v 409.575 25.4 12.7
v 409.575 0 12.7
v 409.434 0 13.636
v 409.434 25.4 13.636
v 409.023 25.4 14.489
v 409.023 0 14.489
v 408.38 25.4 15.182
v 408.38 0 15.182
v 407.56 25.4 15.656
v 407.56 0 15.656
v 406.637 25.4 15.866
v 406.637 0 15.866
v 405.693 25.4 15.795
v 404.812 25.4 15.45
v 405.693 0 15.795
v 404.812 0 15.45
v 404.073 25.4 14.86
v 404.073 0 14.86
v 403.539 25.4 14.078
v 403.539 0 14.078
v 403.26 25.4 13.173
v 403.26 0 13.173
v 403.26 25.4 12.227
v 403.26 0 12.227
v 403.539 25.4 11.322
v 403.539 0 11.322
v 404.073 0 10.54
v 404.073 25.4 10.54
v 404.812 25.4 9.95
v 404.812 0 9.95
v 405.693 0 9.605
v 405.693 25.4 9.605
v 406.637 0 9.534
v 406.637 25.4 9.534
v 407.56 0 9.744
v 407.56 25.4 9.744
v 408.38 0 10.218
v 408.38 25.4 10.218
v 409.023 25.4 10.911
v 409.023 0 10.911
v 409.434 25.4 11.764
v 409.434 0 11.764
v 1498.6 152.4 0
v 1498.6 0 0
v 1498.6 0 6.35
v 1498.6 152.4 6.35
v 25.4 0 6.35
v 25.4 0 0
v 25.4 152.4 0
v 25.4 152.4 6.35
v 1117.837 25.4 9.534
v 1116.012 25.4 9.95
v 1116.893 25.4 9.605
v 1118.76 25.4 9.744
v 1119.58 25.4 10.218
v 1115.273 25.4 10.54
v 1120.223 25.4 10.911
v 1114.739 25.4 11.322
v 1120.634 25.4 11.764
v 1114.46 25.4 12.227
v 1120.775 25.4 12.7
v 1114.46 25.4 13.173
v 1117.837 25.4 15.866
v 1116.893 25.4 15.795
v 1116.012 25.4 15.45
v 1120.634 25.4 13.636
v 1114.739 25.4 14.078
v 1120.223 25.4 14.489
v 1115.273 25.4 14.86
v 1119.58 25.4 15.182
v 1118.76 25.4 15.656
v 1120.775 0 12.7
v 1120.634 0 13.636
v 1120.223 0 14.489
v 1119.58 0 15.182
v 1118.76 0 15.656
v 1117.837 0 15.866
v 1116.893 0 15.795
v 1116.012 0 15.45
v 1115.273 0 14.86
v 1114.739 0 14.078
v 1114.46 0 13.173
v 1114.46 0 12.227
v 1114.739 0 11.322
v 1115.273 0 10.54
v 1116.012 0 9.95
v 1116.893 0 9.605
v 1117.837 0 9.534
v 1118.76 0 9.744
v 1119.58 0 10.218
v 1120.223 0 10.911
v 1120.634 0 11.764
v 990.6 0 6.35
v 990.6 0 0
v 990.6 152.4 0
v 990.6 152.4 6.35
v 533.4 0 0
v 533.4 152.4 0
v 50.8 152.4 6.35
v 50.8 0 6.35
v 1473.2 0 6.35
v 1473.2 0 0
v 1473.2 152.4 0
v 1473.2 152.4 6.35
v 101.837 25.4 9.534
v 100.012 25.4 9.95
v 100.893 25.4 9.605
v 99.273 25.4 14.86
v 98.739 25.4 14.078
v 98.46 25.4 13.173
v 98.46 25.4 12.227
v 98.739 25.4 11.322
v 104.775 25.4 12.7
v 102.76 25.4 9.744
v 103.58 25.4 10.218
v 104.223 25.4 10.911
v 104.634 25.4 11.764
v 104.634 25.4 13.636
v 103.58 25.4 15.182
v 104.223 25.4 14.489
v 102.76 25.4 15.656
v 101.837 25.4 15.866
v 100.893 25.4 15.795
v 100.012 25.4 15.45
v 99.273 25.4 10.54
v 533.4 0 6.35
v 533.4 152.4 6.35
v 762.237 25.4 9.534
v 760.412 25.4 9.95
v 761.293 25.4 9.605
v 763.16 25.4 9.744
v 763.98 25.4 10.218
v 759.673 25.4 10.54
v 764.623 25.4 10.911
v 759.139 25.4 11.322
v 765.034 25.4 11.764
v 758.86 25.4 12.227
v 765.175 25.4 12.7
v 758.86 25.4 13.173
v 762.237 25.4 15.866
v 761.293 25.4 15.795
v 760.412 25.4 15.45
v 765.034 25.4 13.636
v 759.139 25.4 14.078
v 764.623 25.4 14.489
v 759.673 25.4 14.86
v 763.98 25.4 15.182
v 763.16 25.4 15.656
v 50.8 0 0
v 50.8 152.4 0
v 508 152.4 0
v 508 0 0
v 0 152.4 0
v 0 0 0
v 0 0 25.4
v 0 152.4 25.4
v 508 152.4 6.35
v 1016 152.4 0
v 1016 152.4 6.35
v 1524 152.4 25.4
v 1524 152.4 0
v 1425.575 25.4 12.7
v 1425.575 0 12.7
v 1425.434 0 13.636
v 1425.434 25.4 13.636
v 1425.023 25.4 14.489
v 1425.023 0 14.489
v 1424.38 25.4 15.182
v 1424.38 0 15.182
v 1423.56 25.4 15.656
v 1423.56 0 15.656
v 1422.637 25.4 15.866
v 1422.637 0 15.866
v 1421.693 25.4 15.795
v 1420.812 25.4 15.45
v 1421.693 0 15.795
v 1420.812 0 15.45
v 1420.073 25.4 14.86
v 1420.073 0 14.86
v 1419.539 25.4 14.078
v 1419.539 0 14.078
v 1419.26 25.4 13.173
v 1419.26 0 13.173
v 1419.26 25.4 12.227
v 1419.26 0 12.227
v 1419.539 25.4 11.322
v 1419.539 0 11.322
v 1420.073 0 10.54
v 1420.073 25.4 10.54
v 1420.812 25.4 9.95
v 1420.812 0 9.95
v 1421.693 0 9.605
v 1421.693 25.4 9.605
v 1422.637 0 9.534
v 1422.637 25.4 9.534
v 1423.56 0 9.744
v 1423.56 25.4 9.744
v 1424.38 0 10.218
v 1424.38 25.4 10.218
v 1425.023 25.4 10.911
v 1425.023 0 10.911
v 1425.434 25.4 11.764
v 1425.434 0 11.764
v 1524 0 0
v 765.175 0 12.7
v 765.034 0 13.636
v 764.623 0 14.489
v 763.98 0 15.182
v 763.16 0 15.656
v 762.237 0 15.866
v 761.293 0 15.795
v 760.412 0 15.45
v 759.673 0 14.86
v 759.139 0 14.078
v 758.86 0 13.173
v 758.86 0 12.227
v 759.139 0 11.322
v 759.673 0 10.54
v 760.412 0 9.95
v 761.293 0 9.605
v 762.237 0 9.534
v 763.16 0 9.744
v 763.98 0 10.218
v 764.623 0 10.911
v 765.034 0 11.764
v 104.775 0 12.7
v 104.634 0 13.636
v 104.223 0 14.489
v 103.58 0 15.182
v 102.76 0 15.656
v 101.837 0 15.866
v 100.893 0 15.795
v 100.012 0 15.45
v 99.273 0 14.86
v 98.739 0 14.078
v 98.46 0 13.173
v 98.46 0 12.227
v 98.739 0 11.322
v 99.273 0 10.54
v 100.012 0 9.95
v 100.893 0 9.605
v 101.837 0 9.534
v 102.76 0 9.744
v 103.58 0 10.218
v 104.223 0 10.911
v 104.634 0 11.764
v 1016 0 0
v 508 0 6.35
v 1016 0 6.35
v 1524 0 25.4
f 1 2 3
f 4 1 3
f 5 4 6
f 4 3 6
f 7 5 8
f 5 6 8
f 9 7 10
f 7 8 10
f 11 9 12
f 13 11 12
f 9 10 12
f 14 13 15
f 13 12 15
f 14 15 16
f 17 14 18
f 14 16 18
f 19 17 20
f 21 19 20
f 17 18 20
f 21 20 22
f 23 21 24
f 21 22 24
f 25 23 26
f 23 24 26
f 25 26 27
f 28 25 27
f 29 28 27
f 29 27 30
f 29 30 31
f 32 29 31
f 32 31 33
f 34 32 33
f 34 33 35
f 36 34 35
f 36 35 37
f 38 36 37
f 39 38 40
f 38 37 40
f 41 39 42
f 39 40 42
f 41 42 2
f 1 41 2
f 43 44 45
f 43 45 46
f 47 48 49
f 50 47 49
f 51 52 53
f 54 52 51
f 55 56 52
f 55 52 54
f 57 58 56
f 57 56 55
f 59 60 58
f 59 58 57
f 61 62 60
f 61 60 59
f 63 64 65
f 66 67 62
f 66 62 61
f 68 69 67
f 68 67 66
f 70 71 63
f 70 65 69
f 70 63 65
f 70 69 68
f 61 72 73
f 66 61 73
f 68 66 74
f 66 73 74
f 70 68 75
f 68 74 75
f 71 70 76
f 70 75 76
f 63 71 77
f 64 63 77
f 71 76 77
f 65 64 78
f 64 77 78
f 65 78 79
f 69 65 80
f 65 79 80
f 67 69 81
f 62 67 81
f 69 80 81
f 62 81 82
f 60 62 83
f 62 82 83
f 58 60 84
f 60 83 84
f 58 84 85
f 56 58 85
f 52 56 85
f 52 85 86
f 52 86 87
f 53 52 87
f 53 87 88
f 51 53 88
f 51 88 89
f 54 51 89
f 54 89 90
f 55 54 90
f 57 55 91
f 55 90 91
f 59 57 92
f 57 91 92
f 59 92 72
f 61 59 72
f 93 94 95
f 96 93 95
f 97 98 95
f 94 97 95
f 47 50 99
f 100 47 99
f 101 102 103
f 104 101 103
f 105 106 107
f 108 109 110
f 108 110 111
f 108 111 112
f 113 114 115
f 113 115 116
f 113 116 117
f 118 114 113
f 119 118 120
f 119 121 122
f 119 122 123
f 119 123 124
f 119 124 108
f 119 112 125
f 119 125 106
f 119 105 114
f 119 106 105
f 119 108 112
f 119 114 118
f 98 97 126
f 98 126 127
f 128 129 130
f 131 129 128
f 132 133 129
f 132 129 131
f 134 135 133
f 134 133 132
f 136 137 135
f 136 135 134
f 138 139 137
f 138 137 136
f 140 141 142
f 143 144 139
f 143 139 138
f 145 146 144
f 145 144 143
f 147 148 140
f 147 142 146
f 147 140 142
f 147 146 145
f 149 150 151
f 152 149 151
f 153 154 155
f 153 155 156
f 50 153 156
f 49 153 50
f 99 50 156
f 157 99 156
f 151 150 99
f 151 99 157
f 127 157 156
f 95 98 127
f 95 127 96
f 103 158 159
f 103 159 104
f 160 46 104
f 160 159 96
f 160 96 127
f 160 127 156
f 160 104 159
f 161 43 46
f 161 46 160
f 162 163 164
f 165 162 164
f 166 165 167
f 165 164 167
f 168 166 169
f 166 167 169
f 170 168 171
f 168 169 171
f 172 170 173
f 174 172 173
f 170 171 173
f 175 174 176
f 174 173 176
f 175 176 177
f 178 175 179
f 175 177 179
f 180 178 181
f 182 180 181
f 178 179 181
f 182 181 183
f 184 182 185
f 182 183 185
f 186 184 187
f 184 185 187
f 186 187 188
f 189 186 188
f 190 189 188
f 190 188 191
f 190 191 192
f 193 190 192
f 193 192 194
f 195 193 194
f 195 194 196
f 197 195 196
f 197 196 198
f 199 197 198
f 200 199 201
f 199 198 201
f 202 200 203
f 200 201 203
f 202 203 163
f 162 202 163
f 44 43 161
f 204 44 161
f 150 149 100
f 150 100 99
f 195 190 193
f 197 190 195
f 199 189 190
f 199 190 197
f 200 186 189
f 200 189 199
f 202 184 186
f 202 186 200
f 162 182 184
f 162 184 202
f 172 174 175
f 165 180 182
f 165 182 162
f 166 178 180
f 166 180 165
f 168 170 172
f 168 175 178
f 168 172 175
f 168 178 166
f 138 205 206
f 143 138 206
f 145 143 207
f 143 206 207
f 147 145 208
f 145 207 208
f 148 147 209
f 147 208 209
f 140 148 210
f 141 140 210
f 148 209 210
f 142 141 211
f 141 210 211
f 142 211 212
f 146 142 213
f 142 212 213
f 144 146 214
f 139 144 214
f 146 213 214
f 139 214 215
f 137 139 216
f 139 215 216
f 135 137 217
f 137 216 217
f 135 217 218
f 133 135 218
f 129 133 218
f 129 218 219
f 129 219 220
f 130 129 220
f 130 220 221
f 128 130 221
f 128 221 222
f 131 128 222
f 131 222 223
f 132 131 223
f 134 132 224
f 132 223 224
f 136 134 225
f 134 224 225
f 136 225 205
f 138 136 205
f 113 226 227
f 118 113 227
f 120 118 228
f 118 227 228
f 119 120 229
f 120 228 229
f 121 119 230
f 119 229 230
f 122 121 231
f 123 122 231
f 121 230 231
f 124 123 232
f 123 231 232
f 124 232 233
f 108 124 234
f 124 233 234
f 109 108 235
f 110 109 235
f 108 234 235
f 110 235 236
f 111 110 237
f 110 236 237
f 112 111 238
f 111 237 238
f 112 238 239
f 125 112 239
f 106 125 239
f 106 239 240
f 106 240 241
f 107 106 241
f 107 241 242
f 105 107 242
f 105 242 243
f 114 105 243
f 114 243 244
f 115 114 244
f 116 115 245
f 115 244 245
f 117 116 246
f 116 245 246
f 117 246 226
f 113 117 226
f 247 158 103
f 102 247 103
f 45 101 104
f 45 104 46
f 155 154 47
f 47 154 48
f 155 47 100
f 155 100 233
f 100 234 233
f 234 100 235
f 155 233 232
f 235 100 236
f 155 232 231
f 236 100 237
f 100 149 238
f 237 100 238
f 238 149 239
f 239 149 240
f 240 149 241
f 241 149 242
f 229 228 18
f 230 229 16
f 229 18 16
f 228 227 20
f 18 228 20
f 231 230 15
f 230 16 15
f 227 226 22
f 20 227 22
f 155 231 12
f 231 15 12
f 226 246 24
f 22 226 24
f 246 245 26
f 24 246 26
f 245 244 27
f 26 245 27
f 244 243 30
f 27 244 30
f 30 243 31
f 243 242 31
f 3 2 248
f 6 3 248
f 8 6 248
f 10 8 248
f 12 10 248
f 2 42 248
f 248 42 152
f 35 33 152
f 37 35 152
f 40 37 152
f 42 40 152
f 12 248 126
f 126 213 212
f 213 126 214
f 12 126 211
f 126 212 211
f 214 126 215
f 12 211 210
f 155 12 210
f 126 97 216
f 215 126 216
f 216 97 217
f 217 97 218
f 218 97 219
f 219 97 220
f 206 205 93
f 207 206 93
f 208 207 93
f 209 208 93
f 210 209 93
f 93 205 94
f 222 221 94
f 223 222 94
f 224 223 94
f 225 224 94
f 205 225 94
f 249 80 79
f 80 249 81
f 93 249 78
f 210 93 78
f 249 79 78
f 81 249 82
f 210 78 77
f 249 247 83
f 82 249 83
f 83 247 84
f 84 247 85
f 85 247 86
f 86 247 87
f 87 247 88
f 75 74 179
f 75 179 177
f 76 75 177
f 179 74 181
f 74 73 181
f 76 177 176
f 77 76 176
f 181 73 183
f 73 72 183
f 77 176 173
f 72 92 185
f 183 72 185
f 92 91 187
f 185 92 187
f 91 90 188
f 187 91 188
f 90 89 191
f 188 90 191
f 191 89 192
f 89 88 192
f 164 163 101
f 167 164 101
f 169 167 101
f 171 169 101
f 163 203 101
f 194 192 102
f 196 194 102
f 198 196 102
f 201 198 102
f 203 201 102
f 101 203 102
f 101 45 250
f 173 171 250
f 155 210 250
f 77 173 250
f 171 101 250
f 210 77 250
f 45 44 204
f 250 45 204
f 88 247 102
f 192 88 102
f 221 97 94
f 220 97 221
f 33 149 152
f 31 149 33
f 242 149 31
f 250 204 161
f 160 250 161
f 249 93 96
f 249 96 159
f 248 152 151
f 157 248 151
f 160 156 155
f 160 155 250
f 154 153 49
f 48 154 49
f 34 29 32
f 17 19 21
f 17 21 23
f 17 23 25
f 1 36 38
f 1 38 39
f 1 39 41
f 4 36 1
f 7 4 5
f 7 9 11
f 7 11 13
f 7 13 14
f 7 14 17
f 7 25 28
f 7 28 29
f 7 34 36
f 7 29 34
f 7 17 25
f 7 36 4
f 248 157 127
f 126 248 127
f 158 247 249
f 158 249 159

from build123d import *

# Parameters (mm, degrees)
F0_W     = 1524
F0_H     = 152.4
F1_DEPTH = 25.4
F2_W     = 25.4
F2_H     = 215.900069
F3_DEPTH = 6.35
F4_R     = 3.175
F5_DEPTH = 25.4


with BuildPart() as f1:
    # F0 (on Top) → F1 (new body)
    with BuildSketch(Plane.XY):
        with Locations((762, 76.2)):
            Rectangle(F0_W, F0_H)
    extrude(amount=F1_DEPTH)

    # F2 (on Top) → F3 (cut)
    with BuildSketch(Plane.XY):
        with Locations((38.1, 77.015946)):
            Rectangle(F2_W, F2_H)
        with Locations((520.7, 77.015946)):
            Rectangle(F2_W, F2_H)
        with Locations((1003.3, 77.015946)):
            Rectangle(F2_W, F2_H)
        with Locations((1485.9, 77.015946)):
            Rectangle(F2_W, F2_H)
    extrude(amount=F3_DEPTH, mode=Mode.SUBTRACT)

    # F4 (on Front) → F5 (cut)
    with BuildSketch(Plane.XZ):
        with Locations((101.6, 12.7)):
            Circle(F4_R)
        with Locations((406.4, 12.7)):
            Circle(F4_R)
        with Locations((762, 12.7)):
            Circle(F4_R)
        with Locations((1117.6, 12.7)):
            Circle(F4_R)
        with Locations((1422.4, 12.7)):
            Circle(F4_R)
    extrude(amount=-F5_DEPTH, mode=Mode.SUBTRACT)


solid = f1.part
